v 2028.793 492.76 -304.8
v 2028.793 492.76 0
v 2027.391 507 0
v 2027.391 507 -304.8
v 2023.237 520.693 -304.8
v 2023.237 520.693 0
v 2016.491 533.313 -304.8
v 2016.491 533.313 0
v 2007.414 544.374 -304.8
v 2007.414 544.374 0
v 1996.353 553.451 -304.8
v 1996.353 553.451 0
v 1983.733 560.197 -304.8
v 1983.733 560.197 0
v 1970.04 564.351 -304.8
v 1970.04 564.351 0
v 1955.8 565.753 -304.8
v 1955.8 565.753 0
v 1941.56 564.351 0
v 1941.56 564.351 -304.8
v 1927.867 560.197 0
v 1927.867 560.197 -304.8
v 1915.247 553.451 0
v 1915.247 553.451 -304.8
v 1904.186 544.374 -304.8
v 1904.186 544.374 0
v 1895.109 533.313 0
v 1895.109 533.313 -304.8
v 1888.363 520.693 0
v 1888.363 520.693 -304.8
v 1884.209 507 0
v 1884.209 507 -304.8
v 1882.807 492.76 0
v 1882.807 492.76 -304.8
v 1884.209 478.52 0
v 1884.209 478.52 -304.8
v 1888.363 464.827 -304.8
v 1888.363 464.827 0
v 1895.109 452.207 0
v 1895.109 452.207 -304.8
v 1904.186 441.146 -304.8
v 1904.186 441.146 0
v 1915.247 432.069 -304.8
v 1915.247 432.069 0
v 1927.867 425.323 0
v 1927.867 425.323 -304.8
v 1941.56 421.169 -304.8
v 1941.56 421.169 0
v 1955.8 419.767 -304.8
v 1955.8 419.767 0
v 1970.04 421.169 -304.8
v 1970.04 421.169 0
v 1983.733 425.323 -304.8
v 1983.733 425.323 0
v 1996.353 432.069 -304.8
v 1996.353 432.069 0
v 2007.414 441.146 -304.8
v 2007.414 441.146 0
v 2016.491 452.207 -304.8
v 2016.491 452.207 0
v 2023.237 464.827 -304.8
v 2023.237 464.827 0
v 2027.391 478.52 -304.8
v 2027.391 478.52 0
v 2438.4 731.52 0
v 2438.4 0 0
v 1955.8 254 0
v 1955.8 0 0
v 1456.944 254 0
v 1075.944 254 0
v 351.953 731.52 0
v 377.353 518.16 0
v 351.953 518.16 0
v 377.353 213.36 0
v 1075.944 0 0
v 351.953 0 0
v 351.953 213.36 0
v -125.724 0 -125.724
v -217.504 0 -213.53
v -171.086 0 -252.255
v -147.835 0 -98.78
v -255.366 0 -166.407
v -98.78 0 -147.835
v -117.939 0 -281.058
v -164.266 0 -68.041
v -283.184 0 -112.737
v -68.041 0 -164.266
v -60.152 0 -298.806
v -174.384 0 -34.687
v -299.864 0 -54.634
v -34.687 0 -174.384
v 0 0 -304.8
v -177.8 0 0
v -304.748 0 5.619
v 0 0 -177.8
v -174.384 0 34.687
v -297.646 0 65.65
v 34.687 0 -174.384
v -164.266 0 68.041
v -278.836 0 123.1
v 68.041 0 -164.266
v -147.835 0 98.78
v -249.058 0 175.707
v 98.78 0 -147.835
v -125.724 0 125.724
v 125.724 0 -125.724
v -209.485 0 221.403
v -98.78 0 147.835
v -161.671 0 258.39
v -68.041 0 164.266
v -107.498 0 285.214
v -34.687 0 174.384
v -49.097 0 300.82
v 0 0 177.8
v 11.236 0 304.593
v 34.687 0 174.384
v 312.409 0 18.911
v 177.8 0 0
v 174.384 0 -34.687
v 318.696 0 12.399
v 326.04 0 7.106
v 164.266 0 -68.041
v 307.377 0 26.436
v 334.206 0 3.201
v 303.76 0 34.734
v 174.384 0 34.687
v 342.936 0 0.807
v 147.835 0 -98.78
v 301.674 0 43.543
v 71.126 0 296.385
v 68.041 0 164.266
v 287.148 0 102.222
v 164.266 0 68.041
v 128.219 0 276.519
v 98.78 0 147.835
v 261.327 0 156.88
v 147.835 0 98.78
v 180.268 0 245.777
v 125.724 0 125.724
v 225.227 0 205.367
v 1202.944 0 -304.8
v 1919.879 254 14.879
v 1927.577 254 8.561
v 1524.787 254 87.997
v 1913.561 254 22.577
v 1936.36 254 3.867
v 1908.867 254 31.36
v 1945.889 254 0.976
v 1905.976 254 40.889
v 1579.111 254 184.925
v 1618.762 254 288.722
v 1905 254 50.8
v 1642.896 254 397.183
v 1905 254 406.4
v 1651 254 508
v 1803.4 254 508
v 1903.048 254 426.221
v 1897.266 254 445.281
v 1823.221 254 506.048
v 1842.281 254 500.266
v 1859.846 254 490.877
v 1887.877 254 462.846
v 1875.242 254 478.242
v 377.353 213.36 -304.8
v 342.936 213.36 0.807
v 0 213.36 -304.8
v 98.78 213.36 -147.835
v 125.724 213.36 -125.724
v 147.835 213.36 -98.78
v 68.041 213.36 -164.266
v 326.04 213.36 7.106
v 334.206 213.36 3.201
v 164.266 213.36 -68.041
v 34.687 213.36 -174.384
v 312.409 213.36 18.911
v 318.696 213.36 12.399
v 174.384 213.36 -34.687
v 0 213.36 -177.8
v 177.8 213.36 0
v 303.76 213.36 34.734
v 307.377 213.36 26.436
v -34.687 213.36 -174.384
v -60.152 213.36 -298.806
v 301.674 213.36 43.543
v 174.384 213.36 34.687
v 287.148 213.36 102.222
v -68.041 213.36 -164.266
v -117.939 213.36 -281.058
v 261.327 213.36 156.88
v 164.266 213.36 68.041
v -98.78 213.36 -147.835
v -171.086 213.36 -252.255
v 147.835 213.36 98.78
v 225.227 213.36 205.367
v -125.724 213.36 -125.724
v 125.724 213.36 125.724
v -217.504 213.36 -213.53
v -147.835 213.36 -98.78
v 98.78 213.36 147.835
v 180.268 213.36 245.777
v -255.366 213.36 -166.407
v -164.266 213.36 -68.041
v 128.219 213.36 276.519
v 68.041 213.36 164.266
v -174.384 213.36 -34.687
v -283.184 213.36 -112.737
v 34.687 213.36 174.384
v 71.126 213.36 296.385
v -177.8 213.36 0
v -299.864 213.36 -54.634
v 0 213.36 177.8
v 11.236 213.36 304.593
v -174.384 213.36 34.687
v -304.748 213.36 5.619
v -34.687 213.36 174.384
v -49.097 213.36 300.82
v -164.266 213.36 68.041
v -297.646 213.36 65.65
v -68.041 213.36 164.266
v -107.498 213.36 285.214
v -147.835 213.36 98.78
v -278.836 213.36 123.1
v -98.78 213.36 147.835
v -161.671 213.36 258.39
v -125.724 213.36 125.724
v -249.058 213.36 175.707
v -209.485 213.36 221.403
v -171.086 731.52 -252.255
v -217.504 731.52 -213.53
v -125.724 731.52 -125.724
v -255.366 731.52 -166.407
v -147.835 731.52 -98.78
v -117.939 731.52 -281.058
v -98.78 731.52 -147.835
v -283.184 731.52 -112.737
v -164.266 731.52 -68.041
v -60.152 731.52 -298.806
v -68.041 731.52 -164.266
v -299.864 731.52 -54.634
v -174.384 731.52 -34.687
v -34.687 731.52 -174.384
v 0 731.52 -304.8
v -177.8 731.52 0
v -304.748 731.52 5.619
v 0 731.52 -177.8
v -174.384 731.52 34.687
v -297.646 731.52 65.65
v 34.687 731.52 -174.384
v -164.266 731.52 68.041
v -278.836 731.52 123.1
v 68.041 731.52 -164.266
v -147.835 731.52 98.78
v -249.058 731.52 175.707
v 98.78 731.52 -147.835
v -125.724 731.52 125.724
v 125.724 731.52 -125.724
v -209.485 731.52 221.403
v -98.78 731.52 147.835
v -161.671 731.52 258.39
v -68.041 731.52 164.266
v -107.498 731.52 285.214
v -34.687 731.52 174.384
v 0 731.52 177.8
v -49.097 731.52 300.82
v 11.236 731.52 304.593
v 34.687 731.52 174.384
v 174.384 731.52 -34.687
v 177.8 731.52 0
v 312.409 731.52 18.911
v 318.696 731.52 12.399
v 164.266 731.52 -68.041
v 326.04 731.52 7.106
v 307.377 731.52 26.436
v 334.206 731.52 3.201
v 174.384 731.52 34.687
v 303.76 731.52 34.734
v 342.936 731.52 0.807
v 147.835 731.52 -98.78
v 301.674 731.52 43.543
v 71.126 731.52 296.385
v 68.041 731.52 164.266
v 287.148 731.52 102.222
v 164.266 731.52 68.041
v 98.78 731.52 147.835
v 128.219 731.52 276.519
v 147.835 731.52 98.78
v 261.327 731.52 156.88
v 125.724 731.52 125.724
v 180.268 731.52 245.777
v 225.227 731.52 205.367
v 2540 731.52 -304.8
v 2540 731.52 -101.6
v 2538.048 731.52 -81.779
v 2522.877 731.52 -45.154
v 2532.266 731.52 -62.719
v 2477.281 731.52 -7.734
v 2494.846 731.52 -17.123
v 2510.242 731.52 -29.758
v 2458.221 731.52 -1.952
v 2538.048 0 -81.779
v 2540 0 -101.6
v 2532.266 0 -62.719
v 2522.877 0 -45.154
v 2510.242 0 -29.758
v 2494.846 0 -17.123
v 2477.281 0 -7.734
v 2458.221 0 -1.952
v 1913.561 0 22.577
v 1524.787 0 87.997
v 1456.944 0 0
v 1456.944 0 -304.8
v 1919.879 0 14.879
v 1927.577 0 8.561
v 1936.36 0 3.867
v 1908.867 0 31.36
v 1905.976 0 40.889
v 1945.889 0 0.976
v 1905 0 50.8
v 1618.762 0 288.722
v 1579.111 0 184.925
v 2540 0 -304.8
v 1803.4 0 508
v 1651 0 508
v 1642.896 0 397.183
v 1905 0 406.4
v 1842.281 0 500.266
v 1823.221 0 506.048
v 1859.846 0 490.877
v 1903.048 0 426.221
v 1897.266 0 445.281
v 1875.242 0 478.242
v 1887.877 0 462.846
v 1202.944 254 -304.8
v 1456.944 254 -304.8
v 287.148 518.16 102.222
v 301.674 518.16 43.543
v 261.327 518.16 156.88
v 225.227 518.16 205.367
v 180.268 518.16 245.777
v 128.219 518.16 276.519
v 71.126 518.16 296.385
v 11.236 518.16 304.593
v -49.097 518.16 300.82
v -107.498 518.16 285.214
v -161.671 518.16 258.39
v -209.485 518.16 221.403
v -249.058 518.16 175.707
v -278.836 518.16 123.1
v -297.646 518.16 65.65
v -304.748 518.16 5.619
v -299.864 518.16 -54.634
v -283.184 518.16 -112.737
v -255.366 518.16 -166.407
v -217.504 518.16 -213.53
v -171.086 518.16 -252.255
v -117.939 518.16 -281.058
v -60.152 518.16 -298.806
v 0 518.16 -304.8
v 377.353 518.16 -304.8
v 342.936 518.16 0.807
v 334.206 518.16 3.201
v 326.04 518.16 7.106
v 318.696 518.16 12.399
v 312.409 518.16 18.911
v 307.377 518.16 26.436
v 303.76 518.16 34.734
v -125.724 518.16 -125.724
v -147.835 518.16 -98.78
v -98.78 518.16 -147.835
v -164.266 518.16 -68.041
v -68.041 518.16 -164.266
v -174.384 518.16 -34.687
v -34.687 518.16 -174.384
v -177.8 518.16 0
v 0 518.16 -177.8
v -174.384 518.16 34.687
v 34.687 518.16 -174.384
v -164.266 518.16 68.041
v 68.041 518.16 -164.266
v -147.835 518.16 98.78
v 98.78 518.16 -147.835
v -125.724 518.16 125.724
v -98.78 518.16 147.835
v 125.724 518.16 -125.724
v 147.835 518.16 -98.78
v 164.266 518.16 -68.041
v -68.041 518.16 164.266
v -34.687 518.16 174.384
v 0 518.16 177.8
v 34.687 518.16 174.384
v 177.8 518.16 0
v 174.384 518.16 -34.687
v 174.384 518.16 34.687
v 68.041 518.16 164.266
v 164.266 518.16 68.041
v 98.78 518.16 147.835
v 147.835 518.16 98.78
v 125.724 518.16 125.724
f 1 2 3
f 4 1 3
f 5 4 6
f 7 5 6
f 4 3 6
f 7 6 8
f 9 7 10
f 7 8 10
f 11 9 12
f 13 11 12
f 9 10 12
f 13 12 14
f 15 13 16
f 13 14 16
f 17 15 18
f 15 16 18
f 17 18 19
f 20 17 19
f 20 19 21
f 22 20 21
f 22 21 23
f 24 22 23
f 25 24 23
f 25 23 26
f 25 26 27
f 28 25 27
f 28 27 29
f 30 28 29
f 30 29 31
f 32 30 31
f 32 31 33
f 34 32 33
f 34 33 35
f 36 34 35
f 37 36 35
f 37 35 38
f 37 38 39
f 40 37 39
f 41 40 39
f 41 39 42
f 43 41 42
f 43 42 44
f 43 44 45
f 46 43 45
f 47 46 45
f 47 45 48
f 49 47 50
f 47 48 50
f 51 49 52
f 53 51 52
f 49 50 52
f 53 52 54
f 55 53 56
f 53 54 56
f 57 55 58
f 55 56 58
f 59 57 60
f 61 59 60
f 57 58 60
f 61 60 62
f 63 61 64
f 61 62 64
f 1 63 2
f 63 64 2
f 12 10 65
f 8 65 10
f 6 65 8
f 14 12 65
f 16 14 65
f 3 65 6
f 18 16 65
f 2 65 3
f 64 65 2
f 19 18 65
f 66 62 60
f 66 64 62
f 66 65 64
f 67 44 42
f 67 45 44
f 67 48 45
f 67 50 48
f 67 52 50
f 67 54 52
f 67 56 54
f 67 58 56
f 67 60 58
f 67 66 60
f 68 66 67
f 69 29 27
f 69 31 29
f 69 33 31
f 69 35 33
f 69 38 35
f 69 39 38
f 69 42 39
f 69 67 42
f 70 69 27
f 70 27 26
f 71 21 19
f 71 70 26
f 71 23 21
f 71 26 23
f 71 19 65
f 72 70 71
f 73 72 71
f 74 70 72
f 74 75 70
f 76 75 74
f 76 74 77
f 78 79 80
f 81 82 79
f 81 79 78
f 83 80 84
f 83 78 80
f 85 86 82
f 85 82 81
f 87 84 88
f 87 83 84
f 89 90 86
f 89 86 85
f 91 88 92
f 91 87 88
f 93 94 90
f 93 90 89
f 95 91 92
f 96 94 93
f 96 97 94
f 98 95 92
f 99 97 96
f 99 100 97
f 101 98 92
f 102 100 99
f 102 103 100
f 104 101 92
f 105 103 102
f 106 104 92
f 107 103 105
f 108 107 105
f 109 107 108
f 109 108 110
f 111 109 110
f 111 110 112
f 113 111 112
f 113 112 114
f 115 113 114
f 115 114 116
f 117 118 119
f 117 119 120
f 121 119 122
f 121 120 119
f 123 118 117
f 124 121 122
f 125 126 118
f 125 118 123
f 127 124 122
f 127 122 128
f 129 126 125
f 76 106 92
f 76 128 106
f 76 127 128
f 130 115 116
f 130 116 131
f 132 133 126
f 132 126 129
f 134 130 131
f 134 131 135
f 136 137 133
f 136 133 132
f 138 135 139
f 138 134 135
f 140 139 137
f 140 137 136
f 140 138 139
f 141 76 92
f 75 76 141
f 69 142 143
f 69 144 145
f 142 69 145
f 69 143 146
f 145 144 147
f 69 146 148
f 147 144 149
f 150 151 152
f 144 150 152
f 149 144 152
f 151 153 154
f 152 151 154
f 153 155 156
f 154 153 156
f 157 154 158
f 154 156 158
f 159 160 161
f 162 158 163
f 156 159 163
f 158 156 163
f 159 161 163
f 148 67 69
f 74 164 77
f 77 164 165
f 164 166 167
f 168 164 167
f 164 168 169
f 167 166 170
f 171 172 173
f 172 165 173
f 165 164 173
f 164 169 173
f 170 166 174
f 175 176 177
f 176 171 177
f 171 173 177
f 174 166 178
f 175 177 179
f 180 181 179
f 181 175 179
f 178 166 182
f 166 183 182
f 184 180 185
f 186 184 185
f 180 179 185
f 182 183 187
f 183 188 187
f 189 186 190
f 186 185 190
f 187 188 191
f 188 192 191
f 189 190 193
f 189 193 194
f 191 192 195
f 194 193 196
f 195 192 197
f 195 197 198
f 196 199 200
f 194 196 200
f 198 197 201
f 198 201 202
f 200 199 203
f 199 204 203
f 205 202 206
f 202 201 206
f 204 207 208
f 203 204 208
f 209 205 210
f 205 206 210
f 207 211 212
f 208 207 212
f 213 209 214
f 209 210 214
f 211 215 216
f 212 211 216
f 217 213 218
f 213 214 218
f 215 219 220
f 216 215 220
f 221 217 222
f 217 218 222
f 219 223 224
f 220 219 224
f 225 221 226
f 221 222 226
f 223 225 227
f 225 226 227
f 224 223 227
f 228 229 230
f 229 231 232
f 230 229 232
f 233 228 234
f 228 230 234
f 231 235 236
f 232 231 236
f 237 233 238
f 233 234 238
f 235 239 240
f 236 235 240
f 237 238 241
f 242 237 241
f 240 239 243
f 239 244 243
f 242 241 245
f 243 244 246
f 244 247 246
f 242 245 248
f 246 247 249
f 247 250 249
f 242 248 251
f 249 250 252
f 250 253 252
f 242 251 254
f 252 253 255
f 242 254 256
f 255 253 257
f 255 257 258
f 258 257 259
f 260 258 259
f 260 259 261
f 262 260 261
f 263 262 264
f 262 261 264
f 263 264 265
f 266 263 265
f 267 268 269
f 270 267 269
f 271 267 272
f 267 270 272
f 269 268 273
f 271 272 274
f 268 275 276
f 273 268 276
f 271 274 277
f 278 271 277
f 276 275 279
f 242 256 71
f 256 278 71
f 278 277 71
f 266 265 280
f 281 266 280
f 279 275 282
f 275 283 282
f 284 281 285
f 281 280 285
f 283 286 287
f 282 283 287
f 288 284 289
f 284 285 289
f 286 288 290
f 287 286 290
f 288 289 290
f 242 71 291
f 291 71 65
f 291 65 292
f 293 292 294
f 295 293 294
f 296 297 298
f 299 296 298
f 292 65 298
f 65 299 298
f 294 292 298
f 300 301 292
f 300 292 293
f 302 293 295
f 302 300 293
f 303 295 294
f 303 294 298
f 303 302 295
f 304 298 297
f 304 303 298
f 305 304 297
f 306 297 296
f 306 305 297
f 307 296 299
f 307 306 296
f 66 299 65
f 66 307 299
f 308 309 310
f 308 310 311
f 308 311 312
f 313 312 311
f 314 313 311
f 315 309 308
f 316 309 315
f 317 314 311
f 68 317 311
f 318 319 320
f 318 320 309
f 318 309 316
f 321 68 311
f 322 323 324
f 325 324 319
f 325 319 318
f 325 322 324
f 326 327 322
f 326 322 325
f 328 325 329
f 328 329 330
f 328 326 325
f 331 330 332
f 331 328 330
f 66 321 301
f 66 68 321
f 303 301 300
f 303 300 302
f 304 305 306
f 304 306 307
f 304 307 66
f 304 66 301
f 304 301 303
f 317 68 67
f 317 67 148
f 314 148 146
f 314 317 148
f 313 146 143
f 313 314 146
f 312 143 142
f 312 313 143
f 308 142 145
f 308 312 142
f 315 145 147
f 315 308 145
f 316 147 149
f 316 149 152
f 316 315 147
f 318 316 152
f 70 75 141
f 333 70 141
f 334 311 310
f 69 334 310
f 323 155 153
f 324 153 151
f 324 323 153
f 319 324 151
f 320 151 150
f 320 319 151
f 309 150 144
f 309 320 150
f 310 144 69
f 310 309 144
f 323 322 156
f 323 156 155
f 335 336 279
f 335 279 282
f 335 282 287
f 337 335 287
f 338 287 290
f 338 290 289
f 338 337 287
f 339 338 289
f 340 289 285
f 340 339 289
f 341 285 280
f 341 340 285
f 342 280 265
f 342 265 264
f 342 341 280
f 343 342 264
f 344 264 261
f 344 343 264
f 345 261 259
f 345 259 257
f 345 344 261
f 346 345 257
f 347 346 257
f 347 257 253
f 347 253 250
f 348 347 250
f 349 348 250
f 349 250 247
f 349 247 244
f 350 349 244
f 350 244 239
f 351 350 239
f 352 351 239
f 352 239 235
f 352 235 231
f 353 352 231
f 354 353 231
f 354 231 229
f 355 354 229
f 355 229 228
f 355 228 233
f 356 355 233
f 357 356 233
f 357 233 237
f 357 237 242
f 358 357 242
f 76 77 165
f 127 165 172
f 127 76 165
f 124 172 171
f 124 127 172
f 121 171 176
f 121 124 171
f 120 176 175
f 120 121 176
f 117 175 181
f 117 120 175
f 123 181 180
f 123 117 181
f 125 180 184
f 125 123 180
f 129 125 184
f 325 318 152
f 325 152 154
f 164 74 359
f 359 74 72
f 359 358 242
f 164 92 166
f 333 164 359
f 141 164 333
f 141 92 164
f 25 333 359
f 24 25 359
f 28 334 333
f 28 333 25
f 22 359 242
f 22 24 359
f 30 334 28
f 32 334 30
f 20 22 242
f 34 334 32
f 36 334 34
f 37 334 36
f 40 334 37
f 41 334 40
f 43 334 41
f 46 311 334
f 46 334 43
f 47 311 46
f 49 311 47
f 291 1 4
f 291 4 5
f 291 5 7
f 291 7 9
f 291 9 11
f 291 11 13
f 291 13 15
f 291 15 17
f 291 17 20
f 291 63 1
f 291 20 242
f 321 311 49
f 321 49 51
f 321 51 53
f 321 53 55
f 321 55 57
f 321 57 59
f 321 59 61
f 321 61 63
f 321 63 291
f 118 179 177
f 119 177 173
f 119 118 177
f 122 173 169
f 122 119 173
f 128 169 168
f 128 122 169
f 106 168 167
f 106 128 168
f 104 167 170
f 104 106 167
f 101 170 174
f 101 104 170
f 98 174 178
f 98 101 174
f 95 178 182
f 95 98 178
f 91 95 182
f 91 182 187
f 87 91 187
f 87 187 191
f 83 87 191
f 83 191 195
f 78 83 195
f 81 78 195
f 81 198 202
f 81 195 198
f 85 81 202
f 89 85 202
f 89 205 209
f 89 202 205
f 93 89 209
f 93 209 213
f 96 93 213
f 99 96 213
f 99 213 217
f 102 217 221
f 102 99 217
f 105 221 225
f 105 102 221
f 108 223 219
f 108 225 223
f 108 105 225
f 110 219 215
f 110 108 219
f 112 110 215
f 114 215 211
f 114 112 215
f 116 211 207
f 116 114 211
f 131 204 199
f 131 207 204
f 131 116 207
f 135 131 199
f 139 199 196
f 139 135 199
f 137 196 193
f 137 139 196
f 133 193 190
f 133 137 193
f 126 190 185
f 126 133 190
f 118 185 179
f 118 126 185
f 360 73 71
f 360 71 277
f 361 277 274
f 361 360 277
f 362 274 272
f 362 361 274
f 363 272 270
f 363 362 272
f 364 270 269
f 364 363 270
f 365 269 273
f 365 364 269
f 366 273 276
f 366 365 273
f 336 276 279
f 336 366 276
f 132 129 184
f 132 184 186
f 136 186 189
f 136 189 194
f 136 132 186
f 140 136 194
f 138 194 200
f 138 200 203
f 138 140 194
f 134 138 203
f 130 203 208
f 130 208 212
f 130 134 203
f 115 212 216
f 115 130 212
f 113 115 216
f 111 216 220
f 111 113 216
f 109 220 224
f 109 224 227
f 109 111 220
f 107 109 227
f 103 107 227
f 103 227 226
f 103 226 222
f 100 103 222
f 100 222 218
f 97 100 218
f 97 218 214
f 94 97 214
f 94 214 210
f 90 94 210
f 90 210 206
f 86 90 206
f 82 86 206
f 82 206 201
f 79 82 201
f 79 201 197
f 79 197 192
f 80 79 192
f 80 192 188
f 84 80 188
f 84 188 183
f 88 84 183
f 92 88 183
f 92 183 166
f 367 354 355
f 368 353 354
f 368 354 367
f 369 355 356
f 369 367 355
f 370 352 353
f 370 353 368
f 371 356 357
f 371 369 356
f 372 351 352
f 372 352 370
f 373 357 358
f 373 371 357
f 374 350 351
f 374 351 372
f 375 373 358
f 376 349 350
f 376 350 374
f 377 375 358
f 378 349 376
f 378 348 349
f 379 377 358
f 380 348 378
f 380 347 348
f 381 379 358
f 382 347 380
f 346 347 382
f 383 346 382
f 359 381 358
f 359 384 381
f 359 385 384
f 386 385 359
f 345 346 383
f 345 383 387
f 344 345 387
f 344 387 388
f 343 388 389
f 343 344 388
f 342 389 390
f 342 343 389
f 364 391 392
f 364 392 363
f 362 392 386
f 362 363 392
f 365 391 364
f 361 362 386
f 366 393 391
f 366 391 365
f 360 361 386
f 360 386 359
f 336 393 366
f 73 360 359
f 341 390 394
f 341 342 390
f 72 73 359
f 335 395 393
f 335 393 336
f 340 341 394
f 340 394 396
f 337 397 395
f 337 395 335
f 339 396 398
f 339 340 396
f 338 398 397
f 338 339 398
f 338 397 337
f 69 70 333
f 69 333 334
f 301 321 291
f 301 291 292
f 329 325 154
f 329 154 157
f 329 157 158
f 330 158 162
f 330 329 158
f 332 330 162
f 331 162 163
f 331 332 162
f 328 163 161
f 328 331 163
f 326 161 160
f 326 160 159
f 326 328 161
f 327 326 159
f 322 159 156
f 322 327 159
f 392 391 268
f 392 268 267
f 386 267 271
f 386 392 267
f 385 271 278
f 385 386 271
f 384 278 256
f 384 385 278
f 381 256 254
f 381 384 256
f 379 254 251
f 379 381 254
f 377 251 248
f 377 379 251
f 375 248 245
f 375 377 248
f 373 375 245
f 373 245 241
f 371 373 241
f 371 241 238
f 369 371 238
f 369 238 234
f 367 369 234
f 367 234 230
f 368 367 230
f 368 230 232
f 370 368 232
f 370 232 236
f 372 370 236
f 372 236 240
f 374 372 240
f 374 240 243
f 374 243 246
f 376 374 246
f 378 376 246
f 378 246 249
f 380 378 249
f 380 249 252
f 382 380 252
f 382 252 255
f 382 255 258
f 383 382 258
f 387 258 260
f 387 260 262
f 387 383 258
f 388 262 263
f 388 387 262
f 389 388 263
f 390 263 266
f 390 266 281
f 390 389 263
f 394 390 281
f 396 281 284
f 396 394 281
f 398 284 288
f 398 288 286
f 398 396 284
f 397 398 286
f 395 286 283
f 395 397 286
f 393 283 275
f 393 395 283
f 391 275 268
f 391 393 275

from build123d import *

# Parameters (mm, degrees)
F1_DEPTH = 731.52
F2_DEPTH = 254
F3_DEPTH = 254
F4_W     = 902.8388782728
F4_H     = 304.8
F5_DEPTH = 459.74
F4_R     = 72.9930452804
F6_DEPTH = 408.94
F7_DEPTH = 25.4


with BuildPart() as f1:
    # F0 (on Front) → F1 (new body)
    with BuildSketch(Plane.XZ):
        with BuildLine():
            ThreePointArc((0, -177.8), (-177.8, 0), (0, 177.8))
            Line((0, 177.8), (0, 304.8))
            ThreePointArc((0, 304.8), (-304.8, 0), (0, -304.8))
            Line((0, -304.8), (0, -177.8))
        make_face()
        Polygon((1075.944, 0), (1202.944, -304.8), (1456.944, -304.8), (1456.944, 0), align=None)
        with BuildLine():
            Line((1456.944, 0), (1456.944, -304.8))
            Line((1456.944, -304.8), (2540, -304.8))
            Line((2540, -304.8), (2540, -101.6))
            ThreePointArc((2540, -101.6), (2510.2420489686, -29.7579510314), (2438.4, 0))
            Line((2438.4, 0), (1955.8, 0))
            Line((1955.8, 0), (1456.944, 0))
        make_face()
        with BuildLine():
            ThreePointArc((0, 177.8), (125.723585695, 125.723585695), (177.8, 0))
            ThreePointArc((177.8, 0), (125.723585695, -125.723585695), (0, -177.8))
            Line((0, -177.8), (0, -304.8))
            Line((0, -304.8), (1202.944, -304.8))
            Line((1202.944, -304.8), (1075.944, 0))
            Line((1075.944, 0), (351.952724098, 0))
            ThreePointArc((351.952724098, 0), (318.696317626, 12.3988095423), (301.6737635126, 43.5428571429))
            ThreePointArc((301.6737635126, 43.5428571429), (199.5384388318, 230.4071427464), (0, 304.8))
            Line((0, 304.8), (0, 177.8))
        make_face()
    extrude(amount=-F1_DEPTH)

    # F0 (on Front) → F2 (cut)
    with BuildSketch(Plane.XZ):
        Polygon((1075.944, 0), (1202.944, -304.8), (1456.944, -304.8), (1456.944, 0), align=None)
    extrude(amount=-F2_DEPTH, mode=Mode.SUBTRACT)

    # F0 (on Front) → F3 (join)
    with BuildSketch(Plane.XZ):
        with BuildLine():
            ThreePointArc((1651, 508), (1600.8312727093, 236.0997578251), (1456.944, 0))
            Line((1456.944, 0), (1955.8, 0))
            ThreePointArc((1955.8, 0), (1919.8789755157, 14.8789755157), (1905, 50.8))
            Line((1905, 50.8), (1905, 406.4))
            ThreePointArc((1905, 406.4), (1875.2420489686, 478.2420489686), (1803.4, 508))
            Line((1803.4, 508), (1651, 508))
        make_face()
    extrude(amount=-F3_DEPTH)

    # F4 (on face) → F5 (cut, symmetric)
    with BuildSketch(Plane.XY):
        with Locations((-99.4667150384, 365.76)):
            Rectangle(F4_W, F4_H)
    extrude(amount=F5_DEPTH, both=True, mode=Mode.SUBTRACT)

    # F4 (on face) → F6 (cut)
    with BuildSketch(Plane.XY):
        with Locations((1955.8, 492.76)):
            Circle(F4_R)
    extrude(amount=-F6_DEPTH, mode=Mode.SUBTRACT)

    # F7 (cut): a face of the model
    f7_faces = [f1.faces().sort_by_distance(p)[0] for p in [
        (351.952724098, 365.76, -152.4),
    ]]
    extrude(f7_faces, amount=-F7_DEPTH, mode=Mode.SUBTRACT)


solid = f1.part
